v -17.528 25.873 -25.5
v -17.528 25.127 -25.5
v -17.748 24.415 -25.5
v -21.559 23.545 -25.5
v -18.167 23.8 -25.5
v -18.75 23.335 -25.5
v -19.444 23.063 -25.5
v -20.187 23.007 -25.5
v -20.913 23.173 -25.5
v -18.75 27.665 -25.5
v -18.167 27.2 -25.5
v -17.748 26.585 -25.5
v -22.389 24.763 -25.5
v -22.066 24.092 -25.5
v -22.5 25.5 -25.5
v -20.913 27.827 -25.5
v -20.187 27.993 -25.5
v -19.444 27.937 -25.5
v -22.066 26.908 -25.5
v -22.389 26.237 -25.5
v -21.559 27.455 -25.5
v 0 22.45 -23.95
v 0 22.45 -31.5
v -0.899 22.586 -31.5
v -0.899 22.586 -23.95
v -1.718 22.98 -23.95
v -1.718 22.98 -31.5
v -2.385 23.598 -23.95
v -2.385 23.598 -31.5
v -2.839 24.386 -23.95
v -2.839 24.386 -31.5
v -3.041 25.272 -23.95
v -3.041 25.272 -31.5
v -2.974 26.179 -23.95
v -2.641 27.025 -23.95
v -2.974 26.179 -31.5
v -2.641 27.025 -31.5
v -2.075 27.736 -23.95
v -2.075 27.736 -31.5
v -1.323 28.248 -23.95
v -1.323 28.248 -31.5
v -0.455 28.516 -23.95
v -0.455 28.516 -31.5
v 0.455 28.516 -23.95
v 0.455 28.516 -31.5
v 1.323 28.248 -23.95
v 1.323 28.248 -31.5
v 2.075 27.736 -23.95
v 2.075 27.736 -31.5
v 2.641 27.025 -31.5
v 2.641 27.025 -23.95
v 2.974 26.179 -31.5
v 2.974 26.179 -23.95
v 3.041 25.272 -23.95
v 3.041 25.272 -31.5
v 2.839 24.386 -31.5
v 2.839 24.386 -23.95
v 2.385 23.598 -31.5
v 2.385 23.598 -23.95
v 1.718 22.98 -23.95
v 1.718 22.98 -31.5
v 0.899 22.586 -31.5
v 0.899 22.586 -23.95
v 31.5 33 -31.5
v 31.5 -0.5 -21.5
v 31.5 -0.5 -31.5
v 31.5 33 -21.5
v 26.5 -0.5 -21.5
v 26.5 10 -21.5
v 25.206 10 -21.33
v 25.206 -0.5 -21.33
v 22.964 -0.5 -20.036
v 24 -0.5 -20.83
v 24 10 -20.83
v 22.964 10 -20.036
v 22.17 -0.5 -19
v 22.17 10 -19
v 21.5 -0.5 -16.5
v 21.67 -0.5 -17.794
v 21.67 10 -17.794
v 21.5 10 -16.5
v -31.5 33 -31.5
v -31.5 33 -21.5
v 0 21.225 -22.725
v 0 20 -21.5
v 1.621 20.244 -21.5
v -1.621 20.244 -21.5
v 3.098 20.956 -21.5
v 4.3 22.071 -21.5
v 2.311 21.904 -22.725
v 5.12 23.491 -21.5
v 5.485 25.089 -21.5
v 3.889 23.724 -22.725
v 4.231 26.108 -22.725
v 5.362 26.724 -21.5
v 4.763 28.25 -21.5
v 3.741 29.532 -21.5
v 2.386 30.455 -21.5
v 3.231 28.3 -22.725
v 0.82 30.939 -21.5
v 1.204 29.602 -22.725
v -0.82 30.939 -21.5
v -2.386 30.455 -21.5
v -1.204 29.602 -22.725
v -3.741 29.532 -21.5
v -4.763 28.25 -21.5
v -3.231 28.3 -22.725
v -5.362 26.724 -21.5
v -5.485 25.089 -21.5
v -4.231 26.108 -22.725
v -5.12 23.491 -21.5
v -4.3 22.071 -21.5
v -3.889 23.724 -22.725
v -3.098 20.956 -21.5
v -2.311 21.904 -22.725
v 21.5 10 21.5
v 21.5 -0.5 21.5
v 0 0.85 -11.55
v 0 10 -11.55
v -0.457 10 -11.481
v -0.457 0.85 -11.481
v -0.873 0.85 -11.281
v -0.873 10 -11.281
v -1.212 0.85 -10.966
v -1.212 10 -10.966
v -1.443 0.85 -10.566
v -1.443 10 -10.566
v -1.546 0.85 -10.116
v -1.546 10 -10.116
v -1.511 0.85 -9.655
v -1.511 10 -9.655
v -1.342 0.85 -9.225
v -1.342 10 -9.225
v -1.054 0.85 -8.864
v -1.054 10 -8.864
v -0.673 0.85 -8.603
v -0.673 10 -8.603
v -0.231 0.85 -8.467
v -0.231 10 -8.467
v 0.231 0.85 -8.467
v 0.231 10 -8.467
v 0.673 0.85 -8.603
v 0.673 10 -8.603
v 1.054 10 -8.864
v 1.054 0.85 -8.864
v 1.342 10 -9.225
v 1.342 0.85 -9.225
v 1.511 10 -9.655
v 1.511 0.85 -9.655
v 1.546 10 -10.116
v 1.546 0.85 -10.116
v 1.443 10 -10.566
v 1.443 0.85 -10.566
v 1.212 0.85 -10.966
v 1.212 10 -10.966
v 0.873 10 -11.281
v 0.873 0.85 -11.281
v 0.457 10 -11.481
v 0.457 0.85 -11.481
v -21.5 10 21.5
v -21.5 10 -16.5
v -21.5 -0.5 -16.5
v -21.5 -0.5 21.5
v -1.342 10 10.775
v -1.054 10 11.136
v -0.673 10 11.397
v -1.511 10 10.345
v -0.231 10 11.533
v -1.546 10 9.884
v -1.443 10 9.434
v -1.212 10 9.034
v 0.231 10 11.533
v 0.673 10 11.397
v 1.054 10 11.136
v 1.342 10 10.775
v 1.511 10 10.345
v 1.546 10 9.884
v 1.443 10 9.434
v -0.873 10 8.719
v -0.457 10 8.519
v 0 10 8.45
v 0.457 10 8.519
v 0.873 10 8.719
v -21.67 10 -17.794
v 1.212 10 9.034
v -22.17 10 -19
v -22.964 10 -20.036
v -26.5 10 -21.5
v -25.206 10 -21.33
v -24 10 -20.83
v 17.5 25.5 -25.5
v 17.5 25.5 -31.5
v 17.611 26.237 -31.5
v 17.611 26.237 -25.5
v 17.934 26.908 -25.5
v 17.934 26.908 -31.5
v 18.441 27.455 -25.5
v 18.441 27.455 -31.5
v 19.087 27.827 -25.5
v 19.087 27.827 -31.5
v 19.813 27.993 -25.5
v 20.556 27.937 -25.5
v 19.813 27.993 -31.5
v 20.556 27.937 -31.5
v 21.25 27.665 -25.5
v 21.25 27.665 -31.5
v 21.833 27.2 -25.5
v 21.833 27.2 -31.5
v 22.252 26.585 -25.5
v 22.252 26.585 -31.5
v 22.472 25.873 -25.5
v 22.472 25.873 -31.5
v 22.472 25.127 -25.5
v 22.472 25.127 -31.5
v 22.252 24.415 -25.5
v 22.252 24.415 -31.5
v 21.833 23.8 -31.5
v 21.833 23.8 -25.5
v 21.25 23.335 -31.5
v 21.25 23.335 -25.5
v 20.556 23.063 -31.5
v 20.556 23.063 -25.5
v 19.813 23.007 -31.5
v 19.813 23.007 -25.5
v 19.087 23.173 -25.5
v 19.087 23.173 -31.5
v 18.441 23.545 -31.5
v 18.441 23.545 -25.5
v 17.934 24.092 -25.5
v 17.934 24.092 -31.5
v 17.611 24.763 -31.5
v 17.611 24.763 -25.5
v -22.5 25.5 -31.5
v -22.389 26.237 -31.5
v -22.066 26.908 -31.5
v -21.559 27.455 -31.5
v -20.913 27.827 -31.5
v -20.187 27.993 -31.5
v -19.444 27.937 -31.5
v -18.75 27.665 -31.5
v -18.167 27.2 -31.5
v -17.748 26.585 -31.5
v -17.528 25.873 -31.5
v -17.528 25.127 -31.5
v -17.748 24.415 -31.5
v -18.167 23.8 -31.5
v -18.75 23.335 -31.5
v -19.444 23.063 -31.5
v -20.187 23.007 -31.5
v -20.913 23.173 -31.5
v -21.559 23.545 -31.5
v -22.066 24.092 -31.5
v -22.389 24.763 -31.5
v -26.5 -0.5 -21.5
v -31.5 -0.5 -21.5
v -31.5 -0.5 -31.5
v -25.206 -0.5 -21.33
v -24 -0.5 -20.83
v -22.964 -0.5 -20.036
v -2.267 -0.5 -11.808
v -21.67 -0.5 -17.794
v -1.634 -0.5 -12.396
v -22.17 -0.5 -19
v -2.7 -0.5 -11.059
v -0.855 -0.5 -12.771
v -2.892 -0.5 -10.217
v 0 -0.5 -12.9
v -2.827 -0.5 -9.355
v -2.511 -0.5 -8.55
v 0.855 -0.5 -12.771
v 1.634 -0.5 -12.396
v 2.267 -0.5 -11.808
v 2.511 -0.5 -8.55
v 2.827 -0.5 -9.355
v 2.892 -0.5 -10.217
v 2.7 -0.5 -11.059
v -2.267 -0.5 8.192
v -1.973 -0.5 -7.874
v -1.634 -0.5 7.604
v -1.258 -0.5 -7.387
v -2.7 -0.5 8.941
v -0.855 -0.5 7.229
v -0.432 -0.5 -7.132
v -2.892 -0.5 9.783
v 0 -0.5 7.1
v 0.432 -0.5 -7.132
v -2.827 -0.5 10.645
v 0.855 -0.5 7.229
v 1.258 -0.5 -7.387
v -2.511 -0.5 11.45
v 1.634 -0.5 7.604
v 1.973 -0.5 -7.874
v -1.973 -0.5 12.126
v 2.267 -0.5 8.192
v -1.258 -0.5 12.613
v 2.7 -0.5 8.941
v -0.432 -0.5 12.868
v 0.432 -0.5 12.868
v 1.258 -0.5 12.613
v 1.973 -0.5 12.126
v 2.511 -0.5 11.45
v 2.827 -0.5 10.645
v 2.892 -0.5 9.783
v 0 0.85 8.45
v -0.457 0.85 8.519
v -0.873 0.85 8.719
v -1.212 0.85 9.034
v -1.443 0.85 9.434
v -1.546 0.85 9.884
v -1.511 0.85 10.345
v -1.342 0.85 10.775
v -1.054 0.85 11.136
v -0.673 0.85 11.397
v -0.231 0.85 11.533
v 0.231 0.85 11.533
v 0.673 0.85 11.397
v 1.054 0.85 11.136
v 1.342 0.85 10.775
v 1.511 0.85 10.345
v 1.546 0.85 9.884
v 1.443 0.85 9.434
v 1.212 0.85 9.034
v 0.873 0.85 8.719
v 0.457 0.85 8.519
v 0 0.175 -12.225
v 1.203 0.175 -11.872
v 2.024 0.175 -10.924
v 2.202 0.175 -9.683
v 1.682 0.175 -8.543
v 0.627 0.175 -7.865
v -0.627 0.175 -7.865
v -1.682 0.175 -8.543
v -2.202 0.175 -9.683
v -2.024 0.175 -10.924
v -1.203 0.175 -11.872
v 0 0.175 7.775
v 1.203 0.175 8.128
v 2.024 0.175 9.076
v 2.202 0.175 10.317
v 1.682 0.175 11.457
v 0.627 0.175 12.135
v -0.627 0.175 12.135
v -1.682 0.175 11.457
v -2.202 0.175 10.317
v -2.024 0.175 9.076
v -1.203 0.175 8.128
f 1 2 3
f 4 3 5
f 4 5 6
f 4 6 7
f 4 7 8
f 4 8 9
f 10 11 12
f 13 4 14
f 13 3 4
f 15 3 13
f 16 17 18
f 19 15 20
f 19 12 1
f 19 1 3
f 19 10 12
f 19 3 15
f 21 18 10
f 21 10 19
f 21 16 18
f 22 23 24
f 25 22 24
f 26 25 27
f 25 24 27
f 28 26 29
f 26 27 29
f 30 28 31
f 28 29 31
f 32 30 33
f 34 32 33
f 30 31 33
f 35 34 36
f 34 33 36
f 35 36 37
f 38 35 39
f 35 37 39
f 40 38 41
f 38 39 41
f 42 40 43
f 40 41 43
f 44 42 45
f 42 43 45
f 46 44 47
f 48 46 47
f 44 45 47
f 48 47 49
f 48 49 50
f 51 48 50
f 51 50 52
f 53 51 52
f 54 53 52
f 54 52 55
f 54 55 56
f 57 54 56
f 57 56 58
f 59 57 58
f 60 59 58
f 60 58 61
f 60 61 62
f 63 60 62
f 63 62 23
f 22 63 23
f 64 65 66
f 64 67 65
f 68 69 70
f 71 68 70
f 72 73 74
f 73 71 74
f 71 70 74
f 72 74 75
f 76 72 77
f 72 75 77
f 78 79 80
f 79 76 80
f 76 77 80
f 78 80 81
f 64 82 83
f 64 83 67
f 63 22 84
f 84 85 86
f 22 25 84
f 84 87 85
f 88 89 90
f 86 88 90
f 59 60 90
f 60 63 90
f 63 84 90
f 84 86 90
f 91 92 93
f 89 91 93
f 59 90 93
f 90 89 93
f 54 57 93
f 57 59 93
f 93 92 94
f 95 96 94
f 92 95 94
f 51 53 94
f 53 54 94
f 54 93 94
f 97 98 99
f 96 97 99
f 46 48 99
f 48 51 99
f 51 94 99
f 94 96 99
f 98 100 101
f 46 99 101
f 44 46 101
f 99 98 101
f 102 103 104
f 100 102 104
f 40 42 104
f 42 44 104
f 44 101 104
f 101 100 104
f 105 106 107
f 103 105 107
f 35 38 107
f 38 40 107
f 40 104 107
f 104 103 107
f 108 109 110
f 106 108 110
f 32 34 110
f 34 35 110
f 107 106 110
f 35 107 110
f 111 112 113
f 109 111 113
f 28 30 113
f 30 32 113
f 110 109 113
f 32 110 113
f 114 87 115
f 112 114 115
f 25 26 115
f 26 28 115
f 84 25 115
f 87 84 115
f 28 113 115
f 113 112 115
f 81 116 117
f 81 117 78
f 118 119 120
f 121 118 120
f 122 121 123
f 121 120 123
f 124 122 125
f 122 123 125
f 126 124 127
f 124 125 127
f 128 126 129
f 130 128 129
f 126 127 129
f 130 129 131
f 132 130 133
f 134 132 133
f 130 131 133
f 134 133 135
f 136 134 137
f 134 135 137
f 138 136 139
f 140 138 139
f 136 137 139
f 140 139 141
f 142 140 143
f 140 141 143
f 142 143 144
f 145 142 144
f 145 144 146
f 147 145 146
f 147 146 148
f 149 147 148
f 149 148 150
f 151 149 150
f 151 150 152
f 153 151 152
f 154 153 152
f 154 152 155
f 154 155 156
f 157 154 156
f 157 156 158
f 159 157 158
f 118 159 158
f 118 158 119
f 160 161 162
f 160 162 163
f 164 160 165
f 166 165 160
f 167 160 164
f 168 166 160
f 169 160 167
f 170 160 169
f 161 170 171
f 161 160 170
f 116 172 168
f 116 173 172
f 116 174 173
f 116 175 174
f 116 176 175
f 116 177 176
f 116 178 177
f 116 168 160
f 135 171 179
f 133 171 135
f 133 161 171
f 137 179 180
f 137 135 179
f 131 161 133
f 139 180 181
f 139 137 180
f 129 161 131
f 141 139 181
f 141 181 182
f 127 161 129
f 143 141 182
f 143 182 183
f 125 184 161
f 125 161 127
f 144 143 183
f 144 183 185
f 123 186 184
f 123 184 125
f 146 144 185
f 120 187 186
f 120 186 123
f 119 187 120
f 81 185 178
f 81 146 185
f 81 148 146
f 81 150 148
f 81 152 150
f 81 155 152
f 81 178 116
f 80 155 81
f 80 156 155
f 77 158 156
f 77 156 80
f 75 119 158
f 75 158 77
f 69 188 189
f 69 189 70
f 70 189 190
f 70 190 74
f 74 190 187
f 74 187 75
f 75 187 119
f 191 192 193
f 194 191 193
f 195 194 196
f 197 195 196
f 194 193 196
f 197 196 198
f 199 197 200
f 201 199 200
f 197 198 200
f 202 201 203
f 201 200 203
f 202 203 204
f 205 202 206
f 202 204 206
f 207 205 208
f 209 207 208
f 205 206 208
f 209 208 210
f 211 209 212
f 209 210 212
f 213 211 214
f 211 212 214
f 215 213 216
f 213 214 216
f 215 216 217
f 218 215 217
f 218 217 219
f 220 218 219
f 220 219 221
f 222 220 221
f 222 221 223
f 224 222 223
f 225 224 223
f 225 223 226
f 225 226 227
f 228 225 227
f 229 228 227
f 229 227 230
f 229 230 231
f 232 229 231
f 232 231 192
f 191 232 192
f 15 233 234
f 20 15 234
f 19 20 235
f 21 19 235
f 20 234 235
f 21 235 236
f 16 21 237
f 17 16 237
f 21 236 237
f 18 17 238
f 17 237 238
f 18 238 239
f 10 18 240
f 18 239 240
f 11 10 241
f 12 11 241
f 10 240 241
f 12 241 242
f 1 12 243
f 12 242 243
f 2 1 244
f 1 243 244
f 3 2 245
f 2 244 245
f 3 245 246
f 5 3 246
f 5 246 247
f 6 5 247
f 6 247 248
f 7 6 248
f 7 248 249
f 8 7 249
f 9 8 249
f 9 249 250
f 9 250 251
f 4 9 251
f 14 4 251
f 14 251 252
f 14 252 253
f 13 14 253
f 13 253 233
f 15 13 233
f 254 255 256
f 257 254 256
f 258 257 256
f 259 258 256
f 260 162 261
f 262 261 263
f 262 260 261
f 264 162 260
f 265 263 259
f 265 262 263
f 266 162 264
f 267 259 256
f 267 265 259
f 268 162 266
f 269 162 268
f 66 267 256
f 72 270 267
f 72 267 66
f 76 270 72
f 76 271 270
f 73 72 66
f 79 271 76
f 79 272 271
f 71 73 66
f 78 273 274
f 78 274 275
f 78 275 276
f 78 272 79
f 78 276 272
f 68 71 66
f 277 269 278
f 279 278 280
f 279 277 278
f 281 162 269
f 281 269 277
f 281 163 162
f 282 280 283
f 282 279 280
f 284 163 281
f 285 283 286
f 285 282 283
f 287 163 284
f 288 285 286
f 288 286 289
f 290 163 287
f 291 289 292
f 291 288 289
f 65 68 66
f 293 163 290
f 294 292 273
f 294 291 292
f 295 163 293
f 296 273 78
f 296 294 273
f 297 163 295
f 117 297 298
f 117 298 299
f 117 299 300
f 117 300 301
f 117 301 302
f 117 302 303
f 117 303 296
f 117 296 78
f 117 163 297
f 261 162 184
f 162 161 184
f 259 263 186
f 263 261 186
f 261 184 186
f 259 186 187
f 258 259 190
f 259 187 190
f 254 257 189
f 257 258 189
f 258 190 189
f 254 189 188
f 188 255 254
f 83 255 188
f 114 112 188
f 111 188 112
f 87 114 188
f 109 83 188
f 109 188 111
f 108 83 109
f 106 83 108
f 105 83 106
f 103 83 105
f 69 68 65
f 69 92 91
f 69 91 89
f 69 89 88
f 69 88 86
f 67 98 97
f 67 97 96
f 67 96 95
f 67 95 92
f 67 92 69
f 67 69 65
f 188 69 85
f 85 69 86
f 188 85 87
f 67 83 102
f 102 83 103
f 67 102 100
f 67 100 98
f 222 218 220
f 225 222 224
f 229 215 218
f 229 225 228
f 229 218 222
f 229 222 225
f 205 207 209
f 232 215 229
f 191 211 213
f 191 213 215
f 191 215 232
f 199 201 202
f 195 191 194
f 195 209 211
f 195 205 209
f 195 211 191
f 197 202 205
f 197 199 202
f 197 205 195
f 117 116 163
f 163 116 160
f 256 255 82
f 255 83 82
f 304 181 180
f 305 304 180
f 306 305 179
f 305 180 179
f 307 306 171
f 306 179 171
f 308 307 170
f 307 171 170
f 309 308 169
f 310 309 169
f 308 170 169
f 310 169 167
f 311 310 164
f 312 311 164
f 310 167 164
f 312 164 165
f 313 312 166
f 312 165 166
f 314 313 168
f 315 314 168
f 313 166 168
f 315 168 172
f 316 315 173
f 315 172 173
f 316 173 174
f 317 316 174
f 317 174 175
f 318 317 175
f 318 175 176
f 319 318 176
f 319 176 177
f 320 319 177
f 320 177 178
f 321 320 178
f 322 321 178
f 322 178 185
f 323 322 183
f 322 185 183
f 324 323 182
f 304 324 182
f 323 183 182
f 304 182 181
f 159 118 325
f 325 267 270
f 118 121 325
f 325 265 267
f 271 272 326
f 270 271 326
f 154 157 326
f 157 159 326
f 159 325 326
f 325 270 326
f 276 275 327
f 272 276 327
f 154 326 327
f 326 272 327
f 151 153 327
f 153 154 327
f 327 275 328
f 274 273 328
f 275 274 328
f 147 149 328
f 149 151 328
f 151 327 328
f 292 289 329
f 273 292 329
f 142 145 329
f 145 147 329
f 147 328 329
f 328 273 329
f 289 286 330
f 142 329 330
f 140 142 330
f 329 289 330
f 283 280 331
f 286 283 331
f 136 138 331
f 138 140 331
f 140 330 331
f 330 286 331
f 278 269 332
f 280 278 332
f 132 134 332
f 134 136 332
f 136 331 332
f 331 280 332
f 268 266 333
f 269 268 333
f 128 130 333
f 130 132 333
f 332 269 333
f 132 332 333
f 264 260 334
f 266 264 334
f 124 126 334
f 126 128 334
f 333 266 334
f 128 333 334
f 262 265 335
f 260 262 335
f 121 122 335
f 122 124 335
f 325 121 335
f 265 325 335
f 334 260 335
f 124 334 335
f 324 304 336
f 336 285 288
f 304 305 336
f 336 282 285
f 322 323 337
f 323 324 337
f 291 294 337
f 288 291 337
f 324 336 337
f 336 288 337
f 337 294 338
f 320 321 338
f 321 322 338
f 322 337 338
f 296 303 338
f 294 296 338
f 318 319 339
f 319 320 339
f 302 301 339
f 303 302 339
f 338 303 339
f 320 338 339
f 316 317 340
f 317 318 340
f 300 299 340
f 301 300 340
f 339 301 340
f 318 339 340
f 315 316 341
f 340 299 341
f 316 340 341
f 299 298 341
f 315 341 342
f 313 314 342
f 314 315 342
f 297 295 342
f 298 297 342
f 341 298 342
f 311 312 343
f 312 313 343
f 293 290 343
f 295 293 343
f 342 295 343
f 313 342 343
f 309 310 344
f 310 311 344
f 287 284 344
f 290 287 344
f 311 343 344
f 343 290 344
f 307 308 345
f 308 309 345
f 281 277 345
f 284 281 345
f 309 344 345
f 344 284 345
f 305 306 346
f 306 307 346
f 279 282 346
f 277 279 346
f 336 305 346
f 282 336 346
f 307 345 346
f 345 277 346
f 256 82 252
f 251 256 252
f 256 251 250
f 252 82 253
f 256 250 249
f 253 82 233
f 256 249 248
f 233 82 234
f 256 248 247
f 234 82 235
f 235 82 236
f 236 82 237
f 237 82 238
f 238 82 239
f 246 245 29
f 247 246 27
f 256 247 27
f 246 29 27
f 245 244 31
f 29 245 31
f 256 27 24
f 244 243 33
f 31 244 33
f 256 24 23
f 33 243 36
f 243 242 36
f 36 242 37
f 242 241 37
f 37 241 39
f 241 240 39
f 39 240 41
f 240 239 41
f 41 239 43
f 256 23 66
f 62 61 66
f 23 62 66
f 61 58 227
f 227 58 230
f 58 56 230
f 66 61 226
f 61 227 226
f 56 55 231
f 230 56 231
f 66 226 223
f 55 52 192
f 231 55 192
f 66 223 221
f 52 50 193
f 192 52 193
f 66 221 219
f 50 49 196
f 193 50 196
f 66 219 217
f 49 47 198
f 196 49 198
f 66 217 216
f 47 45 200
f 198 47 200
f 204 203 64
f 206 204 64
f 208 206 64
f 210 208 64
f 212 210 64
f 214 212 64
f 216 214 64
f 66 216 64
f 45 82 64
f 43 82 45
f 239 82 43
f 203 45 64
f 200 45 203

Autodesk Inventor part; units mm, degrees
ref_plane "YZ Plane" through (0, 0, 0) normal (1, 0, 0) x (0, 1, 0)
ref_plane "XZ Plane" through (0, 0, 0) normal (0, 1, 0) x (-1, 0, 0)
ref_plane "XY Plane" through (0, 0, 0) normal (0, 0, 1) x (1, 0, 0)
sketch "Sketch1" plane through (0, 0, 0) normal (0, 1, 0) x (-1, 0, 0)
  line L0 (21.5, 21.5) -> (-21.5, 21.5)
  line L1 (-21.5, 21.5) -> (-21.5, -21.5)
  line L2 (-21.5, -21.5) -> (21.5, -21.5)
  line L3 (21.5, -21.5) -> (21.5, 21.5)
  line L4 (21.5, 21.5) -> (-21.5, -21.5) construction
  line L5 (-21.5, 21.5) -> (21.5, -21.5) construction
  point P0 (0, 0)
  dimension "d0" = 43
  dimension "d1" = 43
extrude "Extrusion1" add sketch "Sketch1" along normal blind 10
sketch "Sketch3" plane through (0, 0, 0) normal (0, 1, 0) x (-1, 0, 0)
  line L0 (31.5, -31.5) -> (-31.5, -31.5)
  line L1 (-31.5, -31.5) -> (-31.5, 31.5)
  line L2 (-31.5, 31.5) -> (31.5, 31.5)
  line L3 (31.5, 31.5) -> (31.5, -31.5)
  line L4 (31.5, -31.5) -> (-31.5, 31.5) construction
  line L5 (-31.5, -31.5) -> (31.5, 31.5) construction
  line L6 (-21.5, 21.5) -> (-21.5, -21.5) projected
  line L7 (21.5, 21.5) -> (-21.5, 21.5)
  line L8 (-21.5, 21.5) -> (-21.5, -21.5)
  line L9 (-21.5, -21.5) -> (21.5, -21.5)
  line L10 (21.5, -21.5) -> (21.5, 21.5)
  line L11 (21.5, 21.5) -> (-21.5, -21.5) construction
  line L12 (-21.5, 21.5) -> (21.5, -21.5) construction
  point P0 (0, 0)
  dimension "d13" = 63
  dimension "d14" = 63
extrude "Extrusion2" add sketch "Sketch3" along normal blind 15
sketch "Sketch4" plane through (0, 15, 0) normal (0, 1, 0) x (1, 0, 0)
  line L0 (31.5, -31.5) -> (31.5, 31.5) projected
  line L1 (-31.5, 31.5) -> (31.5, 31.5)
  line L2 (31.5, 31.5) -> (31.5, 21.5)
  line L3 (31.5, 21.5) -> (-31.5, 21.5)
  line L4 (-31.5, 21.5) -> (-31.5, 31.5)
  point P0 (0, 0)
  dimension "d17" = 10
extrude "Extrusion3" add sketch "Sketch4" along normal blind 18
sketch "Sketch5" plane through (31.5, 0, -31.5) normal (0, 0, -1) x (-1, 0, 0)
  line L0 (0, 15) -> (0, 33) construction
  line L1 (63, 15) -> (63, 33) construction
  line L2 (0, 33) -> (63, 33) construction
  line L3 (63, 33) -> (63, 18) construction
  line L4 (63, 18) -> (0, 18) construction
  line L5 (0, 18) -> (0, 33) construction
  line L6 (0, 18) -> (0, 25.5) construction
  line L7 (0, 29.25) -> (63, 29.25)
  line L8 (63, 29.25) -> (63, 21.75)
  line L9 (63, 21.75) -> (0, 21.75)
  line L10 (-63, 29.25) -> (63, 21.75) construction
  line L11 (63, 29.25) -> (-63, 21.75) construction
  line L12 (0, 29.25) -> (0, 21.75)
  line L13 (31.5, 33) -> (31.5, 25.5) construction
  line L14 (31.5, 25.5) -> (11.5, 25.5) construction
  line L15 (31.5, 25.5) -> (51.5, 25.5) construction
  circle A0 centre (11.5, 25.5) radius 2.5
  circle A1 centre (51.5, 25.5) radius 2.5
  point P0 (31.5, 0)
  dimension "d20" = 15
  dimension "d21" = 7.5
  dimension "d22" = 7.5
  dimension "d33" = 20
  dimension "d34" = 20
  dimension "d35" = 5
  dimension "d36" = 5
sketch "Sketch6" plane through (-21.5, 10, -21.5) normal (0, 0, 1) x (1, 0, 0)
  line L0 (-10, 23) -> (53, 23) construction
  line L1 (53, 23) -> (53, 15.5) construction
  line L2 (53, -10) -> (53, 23) construction
  line L3 (53, 15.5) -> (-10, 15.5) construction
  line L4 (-10, -10) -> (-10, 23) construction
  line L5 (21.5, 23) -> (21.5, 15.5) construction
  point P0 (21.5, -10)
  dimension "d25" = 7.5
hole "Hole2" at (0, 25.5, -21.5) direction (0, 0, -1) diameter 6.1 end through all countersink diameter 11 countersink angle 90 clearance for "Countersunk Flat Head Screw ISO 2009/7046" size "M6" standard "ISO"
extrude "Extrusion5" cut sketch "Sketch5" against normal blind 6 contours A0 | A1
sketch "Sketch7" plane through (0, 15, 0) normal (0, 1, 0) x (1, 0, 0)
  line L0 (-31.5, -31.5) -> (31.5, -31.5) projected
  line L1 (21.5, 21.5) -> (-21.5, 21.5) projected
  line L2 (-31.5, -31.5) -> (-21.5, -31.5)
  line L3 (-21.5, -31.5) -> (-21.5, 21.5)
  line L4 (-21.5, 21.5) -> (-31.5, 21.5)
  line L5 (-31.5, 21.5) -> (-31.5, -31.5)
  point P0 (0, 0)
extrude "Extrusion6" add sketch "Sketch7" along normal up to surface (18 mm away)
fillet "Fillet1" radius 18 1 edges at (-26.5, 33, 31.5)
sketch "Sketch9" plane through (0, 33, 0) normal (0, 1, 0) x (1, 0, 0)
  line L0 (21.5, 21.5) -> (-21.5, 21.5) construction
  line L1 (-21.5, 21.5) -> (-31.5, 21.5) construction
  line L2 (-31.5, 31.5) -> (-31.5, -13.5) construction
  line L3 (31.5, -31.5) -> (31.5, 21.5) projected
  line L4 (-31.5, 21.5) -> (31.5, 21.5)
  line L5 (31.5, 21.5) -> (31.5, -31.5)
  line L6 (31.5, -31.5) -> (-31.5, -31.5)
  line L7 (-31.5, -31.5) -> (-31.5, 21.5)
  point P0 (0, 0)
extrude "Extrusion7" cut sketch "Sketch9" against normal up to surface (23 mm away)
sketch "Sketch10" plane through (0, 10, 0) normal (0, 1, 0) x (1, 0, 0)
  line L0 (21.5, -21.5) -> (-21.5, -21.5)
  line L1 (-21.5, -21.5) -> (-21.5, 21.5)
  line L2 (-21.5, 21.5) -> (21.5, 21.5)
  line L3 (21.5, 21.5) -> (21.5, -21.5)
  line L4 (21.5, -21.5) -> (-21.5, 21.5) construction
  line L5 (-21.5, -21.5) -> (21.5, 21.5) construction
  line L6 (31.5, -31.5) -> (-31.5, -31.5) projected
  line L7 (-31.5, 31.5) -> (31.5, 31.5)
  line L8 (31.5, 31.5) -> (31.5, -31.5)
  line L9 (31.5, -31.5) -> (-31.5, -31.5)
  line L10 (-31.5, -31.5) -> (-31.5, 31.5)
  line L11 (-31.5, 31.5) -> (31.5, -31.5) construction
  line L12 (31.5, 31.5) -> (-31.5, -31.5) construction
  line L13 (-31.5, 21.5) -> (31.5, 21.5) projected
  line L14 (21.5, 21.5) -> (31.5, 21.5)
  line L15 (-31.5, 21.5) -> (-21.5, 21.5)
  point P0 (0, 0)
  dimension "d55" = 43
  dimension "d56" = 43
extrude "Extrusion8" cut sketch "Sketch10" against normal through all contours L3 L13 L8 L6 L10 L1 L0
fillet "Fillet2" radius 5 2 edges at (21.5, 5, -21.5) (-21.5, 5, -21.5)
sketch "Sketch11" plane through (0, 0, 0) normal (0, -1, 0) x (1, 0, 0)
  line L0 (21.5, 21.5) -> (-21.5, 21.5) projected
  line L1 (17, -31.5) -> (23, -31.5) projected
  line L2 (-21.5, 21.5) -> (21.5, 21.5)
  line L3 (21.5, 21.5) -> (21.5, -16.5)
  line L4 (21.5, -31.5) -> (-21.5, -31.5)
  line L5 (-21.5, -16.5) -> (-21.5, 21.5)
  line L6 (31.5, -21.5) -> (31.5, -31.5) projected
  line L7 (-26.5, -21.5) -> (-31.5, -21.5)
  line L8 (-31.5, -21.5) -> (-31.5, -31.5)
  line L9 (-31.5, -31.5) -> (31.5, -31.5)
  line L10 (31.5, -31.5) -> (31.5, -21.5)
  arc A0 (-26.5, -21.5) -> (-21.5, -16.5) centre (-26.5, -16.5) ccw
  arc A1 (21.5, -16.5) -> (26.5, -21.5) centre (26.5, -16.5) ccw projected
  arc A2 (21.5, -16.5) -> (26.5, -21.5) centre (26.5, -16.5) ccw
  line L11 (26.5, -21.5) -> (31.5, -21.5)
  point P0 (0, 0)
  dimension "d64" = 63
  dimension "d65" = 5
extrude "Extrusion9" add sketch "Sketch11" along normal blind 0.5
sketch "Sketch12" plane through (0, -0.5, 0) normal (0, -1, 0) x (1, 0, 0)
  line L0 (0, 0) -> (0, 10)
  line L1 (0, 0) -> (0, -10)
  dimension "d68" = 10
  dimension "d69" = 10
hole "Hole4" at (0, -0.5, -10) at (0, -0.5, 10) direction (0, 1, 0) diameter 3.1 end through all countersink diameter 5.8 countersink angle 90 clearance for "Countersunk Flat Head Screw ISO 2009/7046" size "M3" standard "ISO"
properties part number "Camera Holder"
